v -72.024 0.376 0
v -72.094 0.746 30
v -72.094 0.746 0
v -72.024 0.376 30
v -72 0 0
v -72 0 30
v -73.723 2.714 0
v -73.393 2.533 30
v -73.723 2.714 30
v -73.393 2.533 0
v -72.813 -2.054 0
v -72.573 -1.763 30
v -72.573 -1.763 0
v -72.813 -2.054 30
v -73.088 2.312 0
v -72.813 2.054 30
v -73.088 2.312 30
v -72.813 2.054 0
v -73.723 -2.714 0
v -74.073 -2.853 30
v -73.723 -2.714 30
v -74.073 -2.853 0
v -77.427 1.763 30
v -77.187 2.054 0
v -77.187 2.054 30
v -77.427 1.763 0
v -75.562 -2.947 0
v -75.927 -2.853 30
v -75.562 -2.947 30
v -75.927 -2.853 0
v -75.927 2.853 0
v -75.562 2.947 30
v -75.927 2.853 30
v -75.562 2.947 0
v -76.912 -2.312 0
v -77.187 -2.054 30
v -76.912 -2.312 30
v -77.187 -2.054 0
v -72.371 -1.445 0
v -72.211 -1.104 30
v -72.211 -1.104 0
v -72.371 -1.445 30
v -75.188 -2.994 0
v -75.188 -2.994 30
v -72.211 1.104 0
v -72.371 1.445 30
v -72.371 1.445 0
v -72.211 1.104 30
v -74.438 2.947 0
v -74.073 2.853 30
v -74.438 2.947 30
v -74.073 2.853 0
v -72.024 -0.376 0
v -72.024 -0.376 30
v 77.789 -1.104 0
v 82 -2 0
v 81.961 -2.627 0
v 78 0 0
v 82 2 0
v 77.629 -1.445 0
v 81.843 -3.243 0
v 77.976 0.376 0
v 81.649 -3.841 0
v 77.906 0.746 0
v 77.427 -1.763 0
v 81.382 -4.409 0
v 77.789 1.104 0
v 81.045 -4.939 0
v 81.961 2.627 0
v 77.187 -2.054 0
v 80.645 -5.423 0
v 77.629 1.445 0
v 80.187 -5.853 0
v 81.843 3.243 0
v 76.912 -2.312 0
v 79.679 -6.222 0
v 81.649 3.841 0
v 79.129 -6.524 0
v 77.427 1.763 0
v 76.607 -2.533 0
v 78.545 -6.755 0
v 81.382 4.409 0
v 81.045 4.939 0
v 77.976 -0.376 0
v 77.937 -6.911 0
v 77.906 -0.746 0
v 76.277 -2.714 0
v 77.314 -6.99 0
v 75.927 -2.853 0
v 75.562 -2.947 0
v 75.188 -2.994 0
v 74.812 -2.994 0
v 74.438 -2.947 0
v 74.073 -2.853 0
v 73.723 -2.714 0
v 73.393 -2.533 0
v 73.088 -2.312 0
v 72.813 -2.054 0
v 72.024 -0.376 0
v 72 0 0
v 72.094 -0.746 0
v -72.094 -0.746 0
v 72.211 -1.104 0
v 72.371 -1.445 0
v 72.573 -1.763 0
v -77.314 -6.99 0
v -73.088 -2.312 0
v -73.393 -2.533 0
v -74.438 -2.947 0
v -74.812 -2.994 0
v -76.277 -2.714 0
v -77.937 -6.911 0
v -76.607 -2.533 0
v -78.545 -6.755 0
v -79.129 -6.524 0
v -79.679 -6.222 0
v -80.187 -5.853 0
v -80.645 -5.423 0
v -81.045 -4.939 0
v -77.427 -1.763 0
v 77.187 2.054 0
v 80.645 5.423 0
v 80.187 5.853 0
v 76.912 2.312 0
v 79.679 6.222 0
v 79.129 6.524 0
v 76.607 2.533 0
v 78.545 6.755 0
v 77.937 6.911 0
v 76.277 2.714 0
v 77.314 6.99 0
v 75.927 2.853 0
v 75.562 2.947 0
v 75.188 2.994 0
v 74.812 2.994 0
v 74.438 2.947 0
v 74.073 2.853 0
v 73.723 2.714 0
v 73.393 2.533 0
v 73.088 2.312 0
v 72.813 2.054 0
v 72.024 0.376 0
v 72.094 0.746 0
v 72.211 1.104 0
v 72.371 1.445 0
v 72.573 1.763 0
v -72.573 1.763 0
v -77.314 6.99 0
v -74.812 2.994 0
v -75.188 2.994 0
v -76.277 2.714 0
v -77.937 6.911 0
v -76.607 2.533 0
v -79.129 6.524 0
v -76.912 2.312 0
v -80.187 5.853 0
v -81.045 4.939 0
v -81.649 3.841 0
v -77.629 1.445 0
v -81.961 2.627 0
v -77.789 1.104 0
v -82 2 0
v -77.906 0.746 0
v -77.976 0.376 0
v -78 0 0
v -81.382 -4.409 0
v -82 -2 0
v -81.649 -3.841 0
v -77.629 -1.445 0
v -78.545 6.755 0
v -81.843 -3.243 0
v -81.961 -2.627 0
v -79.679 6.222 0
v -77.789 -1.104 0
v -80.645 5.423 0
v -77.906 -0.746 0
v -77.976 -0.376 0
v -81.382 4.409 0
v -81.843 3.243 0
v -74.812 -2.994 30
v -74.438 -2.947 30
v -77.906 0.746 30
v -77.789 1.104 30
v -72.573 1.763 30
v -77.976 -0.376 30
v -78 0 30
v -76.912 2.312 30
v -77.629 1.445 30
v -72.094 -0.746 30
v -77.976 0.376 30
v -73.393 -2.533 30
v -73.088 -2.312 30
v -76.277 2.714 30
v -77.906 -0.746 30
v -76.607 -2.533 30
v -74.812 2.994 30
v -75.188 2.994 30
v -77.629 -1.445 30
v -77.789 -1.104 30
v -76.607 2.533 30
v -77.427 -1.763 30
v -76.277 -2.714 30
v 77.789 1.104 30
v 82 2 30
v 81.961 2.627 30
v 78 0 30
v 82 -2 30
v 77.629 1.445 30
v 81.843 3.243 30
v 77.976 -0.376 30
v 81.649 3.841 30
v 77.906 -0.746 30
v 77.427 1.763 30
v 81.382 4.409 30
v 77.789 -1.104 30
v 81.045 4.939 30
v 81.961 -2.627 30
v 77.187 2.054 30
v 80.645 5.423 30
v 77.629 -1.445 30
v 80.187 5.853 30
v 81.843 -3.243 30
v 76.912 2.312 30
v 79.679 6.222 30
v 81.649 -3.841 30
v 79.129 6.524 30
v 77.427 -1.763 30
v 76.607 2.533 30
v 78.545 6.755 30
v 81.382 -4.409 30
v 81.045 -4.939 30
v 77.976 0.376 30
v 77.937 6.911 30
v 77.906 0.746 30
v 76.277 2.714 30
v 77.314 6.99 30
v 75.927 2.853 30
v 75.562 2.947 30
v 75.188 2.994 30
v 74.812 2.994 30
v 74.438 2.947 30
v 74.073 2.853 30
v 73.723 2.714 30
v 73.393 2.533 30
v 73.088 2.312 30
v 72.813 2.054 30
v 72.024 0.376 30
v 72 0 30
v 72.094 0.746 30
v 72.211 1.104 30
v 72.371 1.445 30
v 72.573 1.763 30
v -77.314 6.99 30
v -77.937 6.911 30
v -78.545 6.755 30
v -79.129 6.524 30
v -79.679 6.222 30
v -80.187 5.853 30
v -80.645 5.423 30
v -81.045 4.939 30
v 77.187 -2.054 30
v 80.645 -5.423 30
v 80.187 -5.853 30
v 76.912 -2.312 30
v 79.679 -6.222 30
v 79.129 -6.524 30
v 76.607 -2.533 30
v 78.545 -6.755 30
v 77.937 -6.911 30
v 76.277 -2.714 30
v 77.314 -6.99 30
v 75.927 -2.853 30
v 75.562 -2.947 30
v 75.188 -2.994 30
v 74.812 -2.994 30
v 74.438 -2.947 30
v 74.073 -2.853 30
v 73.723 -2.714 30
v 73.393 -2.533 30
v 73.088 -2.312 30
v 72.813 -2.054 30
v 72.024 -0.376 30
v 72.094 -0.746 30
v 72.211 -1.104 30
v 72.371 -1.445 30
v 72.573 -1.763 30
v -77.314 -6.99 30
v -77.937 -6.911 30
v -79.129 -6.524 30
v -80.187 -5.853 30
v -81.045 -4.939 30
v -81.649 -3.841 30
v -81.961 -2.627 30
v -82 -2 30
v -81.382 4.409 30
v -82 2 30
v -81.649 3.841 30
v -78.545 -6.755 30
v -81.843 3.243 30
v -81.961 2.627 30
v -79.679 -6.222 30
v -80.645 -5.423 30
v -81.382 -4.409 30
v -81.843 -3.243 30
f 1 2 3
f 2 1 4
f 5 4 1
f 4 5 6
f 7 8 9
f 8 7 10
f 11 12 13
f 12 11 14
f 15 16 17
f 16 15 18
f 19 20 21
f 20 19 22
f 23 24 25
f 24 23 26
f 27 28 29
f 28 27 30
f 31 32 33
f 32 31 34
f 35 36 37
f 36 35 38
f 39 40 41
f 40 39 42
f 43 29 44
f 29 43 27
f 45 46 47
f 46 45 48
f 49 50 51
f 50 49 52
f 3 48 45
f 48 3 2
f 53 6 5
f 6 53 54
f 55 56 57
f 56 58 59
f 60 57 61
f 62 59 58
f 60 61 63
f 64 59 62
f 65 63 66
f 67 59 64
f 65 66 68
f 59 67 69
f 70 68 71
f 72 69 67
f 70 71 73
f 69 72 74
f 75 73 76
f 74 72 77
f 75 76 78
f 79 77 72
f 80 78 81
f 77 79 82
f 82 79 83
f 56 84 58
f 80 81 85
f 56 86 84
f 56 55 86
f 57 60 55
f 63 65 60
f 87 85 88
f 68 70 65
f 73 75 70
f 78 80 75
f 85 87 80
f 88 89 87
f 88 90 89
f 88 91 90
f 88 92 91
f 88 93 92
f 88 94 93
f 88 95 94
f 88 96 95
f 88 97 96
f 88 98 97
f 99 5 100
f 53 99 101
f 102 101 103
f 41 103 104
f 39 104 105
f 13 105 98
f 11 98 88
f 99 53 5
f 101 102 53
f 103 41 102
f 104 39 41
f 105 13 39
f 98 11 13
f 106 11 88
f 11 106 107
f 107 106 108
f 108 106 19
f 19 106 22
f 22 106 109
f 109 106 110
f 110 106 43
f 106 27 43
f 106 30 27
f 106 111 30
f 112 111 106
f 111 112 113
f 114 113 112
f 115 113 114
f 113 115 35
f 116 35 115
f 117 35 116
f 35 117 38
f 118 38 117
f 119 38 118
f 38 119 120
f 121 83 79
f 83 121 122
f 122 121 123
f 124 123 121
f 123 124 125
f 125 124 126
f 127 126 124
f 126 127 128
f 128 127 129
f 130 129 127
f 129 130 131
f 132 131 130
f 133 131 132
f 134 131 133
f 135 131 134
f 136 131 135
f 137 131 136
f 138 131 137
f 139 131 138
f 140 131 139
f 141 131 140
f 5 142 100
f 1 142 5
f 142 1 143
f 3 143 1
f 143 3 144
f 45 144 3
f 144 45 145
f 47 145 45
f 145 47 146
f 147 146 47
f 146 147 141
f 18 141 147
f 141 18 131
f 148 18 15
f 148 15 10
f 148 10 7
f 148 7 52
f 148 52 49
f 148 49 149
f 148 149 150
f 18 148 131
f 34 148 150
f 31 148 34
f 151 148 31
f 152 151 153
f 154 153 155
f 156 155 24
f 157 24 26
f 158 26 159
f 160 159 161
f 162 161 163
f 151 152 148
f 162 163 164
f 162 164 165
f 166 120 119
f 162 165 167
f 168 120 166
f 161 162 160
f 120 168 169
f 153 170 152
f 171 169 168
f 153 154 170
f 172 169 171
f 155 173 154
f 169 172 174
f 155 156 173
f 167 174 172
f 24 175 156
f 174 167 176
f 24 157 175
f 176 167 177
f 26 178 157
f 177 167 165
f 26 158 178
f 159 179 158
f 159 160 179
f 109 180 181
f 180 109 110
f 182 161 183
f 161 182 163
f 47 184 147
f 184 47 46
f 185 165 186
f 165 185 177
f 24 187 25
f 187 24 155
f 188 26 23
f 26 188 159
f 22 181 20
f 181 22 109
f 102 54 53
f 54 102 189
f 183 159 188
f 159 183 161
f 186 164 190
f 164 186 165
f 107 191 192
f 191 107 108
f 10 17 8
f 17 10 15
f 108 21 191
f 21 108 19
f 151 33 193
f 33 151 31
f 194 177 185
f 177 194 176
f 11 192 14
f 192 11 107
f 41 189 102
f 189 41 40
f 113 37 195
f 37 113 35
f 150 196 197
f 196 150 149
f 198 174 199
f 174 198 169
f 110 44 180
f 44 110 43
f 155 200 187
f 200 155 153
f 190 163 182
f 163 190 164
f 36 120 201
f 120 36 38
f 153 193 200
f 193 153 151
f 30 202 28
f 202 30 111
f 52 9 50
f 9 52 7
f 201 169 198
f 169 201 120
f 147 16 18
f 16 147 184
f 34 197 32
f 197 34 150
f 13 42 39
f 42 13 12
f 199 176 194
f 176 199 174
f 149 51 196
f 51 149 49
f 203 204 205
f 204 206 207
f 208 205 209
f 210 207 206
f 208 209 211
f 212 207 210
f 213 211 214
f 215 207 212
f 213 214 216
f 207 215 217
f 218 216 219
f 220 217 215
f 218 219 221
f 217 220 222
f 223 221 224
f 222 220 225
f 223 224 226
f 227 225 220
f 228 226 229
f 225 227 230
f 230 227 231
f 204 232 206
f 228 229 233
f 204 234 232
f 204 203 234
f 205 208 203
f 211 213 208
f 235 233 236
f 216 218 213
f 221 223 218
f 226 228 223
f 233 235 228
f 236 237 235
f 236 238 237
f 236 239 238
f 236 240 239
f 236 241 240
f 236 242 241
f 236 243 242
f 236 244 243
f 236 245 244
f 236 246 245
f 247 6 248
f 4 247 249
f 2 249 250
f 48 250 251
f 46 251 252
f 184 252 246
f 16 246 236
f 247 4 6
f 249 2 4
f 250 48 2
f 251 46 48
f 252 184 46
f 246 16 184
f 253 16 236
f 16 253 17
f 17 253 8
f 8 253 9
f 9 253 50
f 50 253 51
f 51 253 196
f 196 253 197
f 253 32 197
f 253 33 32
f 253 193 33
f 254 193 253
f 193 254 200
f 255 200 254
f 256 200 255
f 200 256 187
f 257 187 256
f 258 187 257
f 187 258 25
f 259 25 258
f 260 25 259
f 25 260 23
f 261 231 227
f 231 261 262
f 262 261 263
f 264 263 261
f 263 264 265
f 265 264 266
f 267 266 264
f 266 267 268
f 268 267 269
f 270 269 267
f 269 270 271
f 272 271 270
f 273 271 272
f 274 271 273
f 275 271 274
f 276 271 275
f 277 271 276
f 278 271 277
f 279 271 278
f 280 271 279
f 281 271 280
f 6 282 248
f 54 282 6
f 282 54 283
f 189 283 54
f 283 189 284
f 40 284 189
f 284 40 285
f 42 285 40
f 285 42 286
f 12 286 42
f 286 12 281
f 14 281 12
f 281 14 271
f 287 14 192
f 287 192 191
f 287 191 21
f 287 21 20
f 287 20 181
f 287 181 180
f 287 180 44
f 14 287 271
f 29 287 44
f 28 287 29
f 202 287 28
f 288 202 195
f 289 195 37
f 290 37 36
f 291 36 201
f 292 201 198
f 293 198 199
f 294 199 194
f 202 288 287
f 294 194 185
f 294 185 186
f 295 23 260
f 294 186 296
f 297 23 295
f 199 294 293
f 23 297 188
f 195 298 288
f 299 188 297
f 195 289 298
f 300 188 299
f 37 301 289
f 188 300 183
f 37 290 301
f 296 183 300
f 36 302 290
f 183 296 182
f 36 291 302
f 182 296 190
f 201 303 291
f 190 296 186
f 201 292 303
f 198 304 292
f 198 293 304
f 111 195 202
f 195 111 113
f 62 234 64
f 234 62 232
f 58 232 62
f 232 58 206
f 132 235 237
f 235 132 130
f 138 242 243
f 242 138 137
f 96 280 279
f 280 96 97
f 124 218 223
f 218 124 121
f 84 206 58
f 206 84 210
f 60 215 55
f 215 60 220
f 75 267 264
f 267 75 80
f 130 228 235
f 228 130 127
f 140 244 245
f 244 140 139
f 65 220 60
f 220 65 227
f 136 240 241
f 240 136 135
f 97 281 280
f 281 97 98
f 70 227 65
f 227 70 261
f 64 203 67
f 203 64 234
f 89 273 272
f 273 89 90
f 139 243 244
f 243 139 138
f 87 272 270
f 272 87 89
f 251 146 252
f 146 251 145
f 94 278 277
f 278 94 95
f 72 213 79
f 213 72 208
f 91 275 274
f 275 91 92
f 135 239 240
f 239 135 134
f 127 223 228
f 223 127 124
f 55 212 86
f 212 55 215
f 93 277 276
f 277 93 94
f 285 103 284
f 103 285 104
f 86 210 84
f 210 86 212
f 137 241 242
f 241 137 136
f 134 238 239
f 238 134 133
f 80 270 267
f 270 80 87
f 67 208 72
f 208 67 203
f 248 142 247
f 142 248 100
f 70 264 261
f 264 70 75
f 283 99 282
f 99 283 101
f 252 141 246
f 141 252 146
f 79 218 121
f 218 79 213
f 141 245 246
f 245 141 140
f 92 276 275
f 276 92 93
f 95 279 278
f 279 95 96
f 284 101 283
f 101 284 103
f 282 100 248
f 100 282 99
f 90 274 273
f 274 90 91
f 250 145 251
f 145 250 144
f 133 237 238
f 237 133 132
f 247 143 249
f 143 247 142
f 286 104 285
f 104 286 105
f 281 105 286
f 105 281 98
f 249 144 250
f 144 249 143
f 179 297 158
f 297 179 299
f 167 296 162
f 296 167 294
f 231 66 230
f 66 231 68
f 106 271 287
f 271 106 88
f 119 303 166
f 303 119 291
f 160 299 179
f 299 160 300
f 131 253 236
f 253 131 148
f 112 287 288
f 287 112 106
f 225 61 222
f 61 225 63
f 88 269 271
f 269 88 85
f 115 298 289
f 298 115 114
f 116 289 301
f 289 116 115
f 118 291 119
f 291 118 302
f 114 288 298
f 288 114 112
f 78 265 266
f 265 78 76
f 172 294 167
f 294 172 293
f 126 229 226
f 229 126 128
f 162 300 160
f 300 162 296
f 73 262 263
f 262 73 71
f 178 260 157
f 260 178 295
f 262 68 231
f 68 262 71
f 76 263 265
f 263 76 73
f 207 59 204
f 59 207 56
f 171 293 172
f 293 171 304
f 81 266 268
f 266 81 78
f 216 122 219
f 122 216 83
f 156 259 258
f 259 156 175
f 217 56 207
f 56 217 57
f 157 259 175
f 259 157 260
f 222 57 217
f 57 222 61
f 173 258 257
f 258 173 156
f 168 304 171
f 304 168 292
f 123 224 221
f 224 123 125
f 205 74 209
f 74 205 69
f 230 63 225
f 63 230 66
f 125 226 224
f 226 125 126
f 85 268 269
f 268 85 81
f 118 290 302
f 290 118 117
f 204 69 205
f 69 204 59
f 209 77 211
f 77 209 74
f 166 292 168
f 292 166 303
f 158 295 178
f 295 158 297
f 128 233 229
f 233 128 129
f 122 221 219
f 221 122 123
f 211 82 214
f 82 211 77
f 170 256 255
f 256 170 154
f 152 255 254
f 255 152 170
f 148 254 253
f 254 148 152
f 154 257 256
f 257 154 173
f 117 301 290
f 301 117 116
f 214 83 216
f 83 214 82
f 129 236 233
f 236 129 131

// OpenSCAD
$fn = 50;


difference() {
	union() {
		hull() {
			translate(v = [-77.0000000000, 2.0000000000, 0]) {
				cylinder(h = 30, r = 5);
			}
			translate(v = [77.0000000000, 2.0000000000, 0]) {
				cylinder(h = 30, r = 5);
			}
			translate(v = [-77.0000000000, -2.0000000000, 0]) {
				cylinder(h = 30, r = 5);
			}
			translate(v = [77.0000000000, -2.0000000000, 0]) {
				cylinder(h = 30, r = 5);
			}
		}
	}
	union() {
		translate(v = [-75.0000000000, 0.0000000000, 0]) {
			cylinder(h = 30, r = 3.0000000000);
		}
		translate(v = [75.0000000000, 0.0000000000, 0]) {
			cylinder(h = 30, r = 3.0000000000);
		}
		translate(v = [-75.0000000000, 0.0000000000, 0]) {
			cylinder(h = 30, r = 1.5000000000);
		}
		translate(v = [75.0000000000, 0.0000000000, 0]) {
			cylinder(h = 30, r = 1.5000000000);
		}
		translate(v = [-75.0000000000, 0.0000000000, 0]) {
			cylinder(h = 30, r = 1.5000000000);
		}
		translate(v = [75.0000000000, 0.0000000000, 0]) {
			cylinder(h = 30, r = 1.5000000000);
		}
		translate(v = [-75.0000000000, 0.0000000000, 0]) {
			cylinder(h = 30, r = 1.5000000000);
		}
		translate(v = [75.0000000000, 0.0000000000, 0]) {
			cylinder(h = 30, r = 1.5000000000);
		}
	}
}
